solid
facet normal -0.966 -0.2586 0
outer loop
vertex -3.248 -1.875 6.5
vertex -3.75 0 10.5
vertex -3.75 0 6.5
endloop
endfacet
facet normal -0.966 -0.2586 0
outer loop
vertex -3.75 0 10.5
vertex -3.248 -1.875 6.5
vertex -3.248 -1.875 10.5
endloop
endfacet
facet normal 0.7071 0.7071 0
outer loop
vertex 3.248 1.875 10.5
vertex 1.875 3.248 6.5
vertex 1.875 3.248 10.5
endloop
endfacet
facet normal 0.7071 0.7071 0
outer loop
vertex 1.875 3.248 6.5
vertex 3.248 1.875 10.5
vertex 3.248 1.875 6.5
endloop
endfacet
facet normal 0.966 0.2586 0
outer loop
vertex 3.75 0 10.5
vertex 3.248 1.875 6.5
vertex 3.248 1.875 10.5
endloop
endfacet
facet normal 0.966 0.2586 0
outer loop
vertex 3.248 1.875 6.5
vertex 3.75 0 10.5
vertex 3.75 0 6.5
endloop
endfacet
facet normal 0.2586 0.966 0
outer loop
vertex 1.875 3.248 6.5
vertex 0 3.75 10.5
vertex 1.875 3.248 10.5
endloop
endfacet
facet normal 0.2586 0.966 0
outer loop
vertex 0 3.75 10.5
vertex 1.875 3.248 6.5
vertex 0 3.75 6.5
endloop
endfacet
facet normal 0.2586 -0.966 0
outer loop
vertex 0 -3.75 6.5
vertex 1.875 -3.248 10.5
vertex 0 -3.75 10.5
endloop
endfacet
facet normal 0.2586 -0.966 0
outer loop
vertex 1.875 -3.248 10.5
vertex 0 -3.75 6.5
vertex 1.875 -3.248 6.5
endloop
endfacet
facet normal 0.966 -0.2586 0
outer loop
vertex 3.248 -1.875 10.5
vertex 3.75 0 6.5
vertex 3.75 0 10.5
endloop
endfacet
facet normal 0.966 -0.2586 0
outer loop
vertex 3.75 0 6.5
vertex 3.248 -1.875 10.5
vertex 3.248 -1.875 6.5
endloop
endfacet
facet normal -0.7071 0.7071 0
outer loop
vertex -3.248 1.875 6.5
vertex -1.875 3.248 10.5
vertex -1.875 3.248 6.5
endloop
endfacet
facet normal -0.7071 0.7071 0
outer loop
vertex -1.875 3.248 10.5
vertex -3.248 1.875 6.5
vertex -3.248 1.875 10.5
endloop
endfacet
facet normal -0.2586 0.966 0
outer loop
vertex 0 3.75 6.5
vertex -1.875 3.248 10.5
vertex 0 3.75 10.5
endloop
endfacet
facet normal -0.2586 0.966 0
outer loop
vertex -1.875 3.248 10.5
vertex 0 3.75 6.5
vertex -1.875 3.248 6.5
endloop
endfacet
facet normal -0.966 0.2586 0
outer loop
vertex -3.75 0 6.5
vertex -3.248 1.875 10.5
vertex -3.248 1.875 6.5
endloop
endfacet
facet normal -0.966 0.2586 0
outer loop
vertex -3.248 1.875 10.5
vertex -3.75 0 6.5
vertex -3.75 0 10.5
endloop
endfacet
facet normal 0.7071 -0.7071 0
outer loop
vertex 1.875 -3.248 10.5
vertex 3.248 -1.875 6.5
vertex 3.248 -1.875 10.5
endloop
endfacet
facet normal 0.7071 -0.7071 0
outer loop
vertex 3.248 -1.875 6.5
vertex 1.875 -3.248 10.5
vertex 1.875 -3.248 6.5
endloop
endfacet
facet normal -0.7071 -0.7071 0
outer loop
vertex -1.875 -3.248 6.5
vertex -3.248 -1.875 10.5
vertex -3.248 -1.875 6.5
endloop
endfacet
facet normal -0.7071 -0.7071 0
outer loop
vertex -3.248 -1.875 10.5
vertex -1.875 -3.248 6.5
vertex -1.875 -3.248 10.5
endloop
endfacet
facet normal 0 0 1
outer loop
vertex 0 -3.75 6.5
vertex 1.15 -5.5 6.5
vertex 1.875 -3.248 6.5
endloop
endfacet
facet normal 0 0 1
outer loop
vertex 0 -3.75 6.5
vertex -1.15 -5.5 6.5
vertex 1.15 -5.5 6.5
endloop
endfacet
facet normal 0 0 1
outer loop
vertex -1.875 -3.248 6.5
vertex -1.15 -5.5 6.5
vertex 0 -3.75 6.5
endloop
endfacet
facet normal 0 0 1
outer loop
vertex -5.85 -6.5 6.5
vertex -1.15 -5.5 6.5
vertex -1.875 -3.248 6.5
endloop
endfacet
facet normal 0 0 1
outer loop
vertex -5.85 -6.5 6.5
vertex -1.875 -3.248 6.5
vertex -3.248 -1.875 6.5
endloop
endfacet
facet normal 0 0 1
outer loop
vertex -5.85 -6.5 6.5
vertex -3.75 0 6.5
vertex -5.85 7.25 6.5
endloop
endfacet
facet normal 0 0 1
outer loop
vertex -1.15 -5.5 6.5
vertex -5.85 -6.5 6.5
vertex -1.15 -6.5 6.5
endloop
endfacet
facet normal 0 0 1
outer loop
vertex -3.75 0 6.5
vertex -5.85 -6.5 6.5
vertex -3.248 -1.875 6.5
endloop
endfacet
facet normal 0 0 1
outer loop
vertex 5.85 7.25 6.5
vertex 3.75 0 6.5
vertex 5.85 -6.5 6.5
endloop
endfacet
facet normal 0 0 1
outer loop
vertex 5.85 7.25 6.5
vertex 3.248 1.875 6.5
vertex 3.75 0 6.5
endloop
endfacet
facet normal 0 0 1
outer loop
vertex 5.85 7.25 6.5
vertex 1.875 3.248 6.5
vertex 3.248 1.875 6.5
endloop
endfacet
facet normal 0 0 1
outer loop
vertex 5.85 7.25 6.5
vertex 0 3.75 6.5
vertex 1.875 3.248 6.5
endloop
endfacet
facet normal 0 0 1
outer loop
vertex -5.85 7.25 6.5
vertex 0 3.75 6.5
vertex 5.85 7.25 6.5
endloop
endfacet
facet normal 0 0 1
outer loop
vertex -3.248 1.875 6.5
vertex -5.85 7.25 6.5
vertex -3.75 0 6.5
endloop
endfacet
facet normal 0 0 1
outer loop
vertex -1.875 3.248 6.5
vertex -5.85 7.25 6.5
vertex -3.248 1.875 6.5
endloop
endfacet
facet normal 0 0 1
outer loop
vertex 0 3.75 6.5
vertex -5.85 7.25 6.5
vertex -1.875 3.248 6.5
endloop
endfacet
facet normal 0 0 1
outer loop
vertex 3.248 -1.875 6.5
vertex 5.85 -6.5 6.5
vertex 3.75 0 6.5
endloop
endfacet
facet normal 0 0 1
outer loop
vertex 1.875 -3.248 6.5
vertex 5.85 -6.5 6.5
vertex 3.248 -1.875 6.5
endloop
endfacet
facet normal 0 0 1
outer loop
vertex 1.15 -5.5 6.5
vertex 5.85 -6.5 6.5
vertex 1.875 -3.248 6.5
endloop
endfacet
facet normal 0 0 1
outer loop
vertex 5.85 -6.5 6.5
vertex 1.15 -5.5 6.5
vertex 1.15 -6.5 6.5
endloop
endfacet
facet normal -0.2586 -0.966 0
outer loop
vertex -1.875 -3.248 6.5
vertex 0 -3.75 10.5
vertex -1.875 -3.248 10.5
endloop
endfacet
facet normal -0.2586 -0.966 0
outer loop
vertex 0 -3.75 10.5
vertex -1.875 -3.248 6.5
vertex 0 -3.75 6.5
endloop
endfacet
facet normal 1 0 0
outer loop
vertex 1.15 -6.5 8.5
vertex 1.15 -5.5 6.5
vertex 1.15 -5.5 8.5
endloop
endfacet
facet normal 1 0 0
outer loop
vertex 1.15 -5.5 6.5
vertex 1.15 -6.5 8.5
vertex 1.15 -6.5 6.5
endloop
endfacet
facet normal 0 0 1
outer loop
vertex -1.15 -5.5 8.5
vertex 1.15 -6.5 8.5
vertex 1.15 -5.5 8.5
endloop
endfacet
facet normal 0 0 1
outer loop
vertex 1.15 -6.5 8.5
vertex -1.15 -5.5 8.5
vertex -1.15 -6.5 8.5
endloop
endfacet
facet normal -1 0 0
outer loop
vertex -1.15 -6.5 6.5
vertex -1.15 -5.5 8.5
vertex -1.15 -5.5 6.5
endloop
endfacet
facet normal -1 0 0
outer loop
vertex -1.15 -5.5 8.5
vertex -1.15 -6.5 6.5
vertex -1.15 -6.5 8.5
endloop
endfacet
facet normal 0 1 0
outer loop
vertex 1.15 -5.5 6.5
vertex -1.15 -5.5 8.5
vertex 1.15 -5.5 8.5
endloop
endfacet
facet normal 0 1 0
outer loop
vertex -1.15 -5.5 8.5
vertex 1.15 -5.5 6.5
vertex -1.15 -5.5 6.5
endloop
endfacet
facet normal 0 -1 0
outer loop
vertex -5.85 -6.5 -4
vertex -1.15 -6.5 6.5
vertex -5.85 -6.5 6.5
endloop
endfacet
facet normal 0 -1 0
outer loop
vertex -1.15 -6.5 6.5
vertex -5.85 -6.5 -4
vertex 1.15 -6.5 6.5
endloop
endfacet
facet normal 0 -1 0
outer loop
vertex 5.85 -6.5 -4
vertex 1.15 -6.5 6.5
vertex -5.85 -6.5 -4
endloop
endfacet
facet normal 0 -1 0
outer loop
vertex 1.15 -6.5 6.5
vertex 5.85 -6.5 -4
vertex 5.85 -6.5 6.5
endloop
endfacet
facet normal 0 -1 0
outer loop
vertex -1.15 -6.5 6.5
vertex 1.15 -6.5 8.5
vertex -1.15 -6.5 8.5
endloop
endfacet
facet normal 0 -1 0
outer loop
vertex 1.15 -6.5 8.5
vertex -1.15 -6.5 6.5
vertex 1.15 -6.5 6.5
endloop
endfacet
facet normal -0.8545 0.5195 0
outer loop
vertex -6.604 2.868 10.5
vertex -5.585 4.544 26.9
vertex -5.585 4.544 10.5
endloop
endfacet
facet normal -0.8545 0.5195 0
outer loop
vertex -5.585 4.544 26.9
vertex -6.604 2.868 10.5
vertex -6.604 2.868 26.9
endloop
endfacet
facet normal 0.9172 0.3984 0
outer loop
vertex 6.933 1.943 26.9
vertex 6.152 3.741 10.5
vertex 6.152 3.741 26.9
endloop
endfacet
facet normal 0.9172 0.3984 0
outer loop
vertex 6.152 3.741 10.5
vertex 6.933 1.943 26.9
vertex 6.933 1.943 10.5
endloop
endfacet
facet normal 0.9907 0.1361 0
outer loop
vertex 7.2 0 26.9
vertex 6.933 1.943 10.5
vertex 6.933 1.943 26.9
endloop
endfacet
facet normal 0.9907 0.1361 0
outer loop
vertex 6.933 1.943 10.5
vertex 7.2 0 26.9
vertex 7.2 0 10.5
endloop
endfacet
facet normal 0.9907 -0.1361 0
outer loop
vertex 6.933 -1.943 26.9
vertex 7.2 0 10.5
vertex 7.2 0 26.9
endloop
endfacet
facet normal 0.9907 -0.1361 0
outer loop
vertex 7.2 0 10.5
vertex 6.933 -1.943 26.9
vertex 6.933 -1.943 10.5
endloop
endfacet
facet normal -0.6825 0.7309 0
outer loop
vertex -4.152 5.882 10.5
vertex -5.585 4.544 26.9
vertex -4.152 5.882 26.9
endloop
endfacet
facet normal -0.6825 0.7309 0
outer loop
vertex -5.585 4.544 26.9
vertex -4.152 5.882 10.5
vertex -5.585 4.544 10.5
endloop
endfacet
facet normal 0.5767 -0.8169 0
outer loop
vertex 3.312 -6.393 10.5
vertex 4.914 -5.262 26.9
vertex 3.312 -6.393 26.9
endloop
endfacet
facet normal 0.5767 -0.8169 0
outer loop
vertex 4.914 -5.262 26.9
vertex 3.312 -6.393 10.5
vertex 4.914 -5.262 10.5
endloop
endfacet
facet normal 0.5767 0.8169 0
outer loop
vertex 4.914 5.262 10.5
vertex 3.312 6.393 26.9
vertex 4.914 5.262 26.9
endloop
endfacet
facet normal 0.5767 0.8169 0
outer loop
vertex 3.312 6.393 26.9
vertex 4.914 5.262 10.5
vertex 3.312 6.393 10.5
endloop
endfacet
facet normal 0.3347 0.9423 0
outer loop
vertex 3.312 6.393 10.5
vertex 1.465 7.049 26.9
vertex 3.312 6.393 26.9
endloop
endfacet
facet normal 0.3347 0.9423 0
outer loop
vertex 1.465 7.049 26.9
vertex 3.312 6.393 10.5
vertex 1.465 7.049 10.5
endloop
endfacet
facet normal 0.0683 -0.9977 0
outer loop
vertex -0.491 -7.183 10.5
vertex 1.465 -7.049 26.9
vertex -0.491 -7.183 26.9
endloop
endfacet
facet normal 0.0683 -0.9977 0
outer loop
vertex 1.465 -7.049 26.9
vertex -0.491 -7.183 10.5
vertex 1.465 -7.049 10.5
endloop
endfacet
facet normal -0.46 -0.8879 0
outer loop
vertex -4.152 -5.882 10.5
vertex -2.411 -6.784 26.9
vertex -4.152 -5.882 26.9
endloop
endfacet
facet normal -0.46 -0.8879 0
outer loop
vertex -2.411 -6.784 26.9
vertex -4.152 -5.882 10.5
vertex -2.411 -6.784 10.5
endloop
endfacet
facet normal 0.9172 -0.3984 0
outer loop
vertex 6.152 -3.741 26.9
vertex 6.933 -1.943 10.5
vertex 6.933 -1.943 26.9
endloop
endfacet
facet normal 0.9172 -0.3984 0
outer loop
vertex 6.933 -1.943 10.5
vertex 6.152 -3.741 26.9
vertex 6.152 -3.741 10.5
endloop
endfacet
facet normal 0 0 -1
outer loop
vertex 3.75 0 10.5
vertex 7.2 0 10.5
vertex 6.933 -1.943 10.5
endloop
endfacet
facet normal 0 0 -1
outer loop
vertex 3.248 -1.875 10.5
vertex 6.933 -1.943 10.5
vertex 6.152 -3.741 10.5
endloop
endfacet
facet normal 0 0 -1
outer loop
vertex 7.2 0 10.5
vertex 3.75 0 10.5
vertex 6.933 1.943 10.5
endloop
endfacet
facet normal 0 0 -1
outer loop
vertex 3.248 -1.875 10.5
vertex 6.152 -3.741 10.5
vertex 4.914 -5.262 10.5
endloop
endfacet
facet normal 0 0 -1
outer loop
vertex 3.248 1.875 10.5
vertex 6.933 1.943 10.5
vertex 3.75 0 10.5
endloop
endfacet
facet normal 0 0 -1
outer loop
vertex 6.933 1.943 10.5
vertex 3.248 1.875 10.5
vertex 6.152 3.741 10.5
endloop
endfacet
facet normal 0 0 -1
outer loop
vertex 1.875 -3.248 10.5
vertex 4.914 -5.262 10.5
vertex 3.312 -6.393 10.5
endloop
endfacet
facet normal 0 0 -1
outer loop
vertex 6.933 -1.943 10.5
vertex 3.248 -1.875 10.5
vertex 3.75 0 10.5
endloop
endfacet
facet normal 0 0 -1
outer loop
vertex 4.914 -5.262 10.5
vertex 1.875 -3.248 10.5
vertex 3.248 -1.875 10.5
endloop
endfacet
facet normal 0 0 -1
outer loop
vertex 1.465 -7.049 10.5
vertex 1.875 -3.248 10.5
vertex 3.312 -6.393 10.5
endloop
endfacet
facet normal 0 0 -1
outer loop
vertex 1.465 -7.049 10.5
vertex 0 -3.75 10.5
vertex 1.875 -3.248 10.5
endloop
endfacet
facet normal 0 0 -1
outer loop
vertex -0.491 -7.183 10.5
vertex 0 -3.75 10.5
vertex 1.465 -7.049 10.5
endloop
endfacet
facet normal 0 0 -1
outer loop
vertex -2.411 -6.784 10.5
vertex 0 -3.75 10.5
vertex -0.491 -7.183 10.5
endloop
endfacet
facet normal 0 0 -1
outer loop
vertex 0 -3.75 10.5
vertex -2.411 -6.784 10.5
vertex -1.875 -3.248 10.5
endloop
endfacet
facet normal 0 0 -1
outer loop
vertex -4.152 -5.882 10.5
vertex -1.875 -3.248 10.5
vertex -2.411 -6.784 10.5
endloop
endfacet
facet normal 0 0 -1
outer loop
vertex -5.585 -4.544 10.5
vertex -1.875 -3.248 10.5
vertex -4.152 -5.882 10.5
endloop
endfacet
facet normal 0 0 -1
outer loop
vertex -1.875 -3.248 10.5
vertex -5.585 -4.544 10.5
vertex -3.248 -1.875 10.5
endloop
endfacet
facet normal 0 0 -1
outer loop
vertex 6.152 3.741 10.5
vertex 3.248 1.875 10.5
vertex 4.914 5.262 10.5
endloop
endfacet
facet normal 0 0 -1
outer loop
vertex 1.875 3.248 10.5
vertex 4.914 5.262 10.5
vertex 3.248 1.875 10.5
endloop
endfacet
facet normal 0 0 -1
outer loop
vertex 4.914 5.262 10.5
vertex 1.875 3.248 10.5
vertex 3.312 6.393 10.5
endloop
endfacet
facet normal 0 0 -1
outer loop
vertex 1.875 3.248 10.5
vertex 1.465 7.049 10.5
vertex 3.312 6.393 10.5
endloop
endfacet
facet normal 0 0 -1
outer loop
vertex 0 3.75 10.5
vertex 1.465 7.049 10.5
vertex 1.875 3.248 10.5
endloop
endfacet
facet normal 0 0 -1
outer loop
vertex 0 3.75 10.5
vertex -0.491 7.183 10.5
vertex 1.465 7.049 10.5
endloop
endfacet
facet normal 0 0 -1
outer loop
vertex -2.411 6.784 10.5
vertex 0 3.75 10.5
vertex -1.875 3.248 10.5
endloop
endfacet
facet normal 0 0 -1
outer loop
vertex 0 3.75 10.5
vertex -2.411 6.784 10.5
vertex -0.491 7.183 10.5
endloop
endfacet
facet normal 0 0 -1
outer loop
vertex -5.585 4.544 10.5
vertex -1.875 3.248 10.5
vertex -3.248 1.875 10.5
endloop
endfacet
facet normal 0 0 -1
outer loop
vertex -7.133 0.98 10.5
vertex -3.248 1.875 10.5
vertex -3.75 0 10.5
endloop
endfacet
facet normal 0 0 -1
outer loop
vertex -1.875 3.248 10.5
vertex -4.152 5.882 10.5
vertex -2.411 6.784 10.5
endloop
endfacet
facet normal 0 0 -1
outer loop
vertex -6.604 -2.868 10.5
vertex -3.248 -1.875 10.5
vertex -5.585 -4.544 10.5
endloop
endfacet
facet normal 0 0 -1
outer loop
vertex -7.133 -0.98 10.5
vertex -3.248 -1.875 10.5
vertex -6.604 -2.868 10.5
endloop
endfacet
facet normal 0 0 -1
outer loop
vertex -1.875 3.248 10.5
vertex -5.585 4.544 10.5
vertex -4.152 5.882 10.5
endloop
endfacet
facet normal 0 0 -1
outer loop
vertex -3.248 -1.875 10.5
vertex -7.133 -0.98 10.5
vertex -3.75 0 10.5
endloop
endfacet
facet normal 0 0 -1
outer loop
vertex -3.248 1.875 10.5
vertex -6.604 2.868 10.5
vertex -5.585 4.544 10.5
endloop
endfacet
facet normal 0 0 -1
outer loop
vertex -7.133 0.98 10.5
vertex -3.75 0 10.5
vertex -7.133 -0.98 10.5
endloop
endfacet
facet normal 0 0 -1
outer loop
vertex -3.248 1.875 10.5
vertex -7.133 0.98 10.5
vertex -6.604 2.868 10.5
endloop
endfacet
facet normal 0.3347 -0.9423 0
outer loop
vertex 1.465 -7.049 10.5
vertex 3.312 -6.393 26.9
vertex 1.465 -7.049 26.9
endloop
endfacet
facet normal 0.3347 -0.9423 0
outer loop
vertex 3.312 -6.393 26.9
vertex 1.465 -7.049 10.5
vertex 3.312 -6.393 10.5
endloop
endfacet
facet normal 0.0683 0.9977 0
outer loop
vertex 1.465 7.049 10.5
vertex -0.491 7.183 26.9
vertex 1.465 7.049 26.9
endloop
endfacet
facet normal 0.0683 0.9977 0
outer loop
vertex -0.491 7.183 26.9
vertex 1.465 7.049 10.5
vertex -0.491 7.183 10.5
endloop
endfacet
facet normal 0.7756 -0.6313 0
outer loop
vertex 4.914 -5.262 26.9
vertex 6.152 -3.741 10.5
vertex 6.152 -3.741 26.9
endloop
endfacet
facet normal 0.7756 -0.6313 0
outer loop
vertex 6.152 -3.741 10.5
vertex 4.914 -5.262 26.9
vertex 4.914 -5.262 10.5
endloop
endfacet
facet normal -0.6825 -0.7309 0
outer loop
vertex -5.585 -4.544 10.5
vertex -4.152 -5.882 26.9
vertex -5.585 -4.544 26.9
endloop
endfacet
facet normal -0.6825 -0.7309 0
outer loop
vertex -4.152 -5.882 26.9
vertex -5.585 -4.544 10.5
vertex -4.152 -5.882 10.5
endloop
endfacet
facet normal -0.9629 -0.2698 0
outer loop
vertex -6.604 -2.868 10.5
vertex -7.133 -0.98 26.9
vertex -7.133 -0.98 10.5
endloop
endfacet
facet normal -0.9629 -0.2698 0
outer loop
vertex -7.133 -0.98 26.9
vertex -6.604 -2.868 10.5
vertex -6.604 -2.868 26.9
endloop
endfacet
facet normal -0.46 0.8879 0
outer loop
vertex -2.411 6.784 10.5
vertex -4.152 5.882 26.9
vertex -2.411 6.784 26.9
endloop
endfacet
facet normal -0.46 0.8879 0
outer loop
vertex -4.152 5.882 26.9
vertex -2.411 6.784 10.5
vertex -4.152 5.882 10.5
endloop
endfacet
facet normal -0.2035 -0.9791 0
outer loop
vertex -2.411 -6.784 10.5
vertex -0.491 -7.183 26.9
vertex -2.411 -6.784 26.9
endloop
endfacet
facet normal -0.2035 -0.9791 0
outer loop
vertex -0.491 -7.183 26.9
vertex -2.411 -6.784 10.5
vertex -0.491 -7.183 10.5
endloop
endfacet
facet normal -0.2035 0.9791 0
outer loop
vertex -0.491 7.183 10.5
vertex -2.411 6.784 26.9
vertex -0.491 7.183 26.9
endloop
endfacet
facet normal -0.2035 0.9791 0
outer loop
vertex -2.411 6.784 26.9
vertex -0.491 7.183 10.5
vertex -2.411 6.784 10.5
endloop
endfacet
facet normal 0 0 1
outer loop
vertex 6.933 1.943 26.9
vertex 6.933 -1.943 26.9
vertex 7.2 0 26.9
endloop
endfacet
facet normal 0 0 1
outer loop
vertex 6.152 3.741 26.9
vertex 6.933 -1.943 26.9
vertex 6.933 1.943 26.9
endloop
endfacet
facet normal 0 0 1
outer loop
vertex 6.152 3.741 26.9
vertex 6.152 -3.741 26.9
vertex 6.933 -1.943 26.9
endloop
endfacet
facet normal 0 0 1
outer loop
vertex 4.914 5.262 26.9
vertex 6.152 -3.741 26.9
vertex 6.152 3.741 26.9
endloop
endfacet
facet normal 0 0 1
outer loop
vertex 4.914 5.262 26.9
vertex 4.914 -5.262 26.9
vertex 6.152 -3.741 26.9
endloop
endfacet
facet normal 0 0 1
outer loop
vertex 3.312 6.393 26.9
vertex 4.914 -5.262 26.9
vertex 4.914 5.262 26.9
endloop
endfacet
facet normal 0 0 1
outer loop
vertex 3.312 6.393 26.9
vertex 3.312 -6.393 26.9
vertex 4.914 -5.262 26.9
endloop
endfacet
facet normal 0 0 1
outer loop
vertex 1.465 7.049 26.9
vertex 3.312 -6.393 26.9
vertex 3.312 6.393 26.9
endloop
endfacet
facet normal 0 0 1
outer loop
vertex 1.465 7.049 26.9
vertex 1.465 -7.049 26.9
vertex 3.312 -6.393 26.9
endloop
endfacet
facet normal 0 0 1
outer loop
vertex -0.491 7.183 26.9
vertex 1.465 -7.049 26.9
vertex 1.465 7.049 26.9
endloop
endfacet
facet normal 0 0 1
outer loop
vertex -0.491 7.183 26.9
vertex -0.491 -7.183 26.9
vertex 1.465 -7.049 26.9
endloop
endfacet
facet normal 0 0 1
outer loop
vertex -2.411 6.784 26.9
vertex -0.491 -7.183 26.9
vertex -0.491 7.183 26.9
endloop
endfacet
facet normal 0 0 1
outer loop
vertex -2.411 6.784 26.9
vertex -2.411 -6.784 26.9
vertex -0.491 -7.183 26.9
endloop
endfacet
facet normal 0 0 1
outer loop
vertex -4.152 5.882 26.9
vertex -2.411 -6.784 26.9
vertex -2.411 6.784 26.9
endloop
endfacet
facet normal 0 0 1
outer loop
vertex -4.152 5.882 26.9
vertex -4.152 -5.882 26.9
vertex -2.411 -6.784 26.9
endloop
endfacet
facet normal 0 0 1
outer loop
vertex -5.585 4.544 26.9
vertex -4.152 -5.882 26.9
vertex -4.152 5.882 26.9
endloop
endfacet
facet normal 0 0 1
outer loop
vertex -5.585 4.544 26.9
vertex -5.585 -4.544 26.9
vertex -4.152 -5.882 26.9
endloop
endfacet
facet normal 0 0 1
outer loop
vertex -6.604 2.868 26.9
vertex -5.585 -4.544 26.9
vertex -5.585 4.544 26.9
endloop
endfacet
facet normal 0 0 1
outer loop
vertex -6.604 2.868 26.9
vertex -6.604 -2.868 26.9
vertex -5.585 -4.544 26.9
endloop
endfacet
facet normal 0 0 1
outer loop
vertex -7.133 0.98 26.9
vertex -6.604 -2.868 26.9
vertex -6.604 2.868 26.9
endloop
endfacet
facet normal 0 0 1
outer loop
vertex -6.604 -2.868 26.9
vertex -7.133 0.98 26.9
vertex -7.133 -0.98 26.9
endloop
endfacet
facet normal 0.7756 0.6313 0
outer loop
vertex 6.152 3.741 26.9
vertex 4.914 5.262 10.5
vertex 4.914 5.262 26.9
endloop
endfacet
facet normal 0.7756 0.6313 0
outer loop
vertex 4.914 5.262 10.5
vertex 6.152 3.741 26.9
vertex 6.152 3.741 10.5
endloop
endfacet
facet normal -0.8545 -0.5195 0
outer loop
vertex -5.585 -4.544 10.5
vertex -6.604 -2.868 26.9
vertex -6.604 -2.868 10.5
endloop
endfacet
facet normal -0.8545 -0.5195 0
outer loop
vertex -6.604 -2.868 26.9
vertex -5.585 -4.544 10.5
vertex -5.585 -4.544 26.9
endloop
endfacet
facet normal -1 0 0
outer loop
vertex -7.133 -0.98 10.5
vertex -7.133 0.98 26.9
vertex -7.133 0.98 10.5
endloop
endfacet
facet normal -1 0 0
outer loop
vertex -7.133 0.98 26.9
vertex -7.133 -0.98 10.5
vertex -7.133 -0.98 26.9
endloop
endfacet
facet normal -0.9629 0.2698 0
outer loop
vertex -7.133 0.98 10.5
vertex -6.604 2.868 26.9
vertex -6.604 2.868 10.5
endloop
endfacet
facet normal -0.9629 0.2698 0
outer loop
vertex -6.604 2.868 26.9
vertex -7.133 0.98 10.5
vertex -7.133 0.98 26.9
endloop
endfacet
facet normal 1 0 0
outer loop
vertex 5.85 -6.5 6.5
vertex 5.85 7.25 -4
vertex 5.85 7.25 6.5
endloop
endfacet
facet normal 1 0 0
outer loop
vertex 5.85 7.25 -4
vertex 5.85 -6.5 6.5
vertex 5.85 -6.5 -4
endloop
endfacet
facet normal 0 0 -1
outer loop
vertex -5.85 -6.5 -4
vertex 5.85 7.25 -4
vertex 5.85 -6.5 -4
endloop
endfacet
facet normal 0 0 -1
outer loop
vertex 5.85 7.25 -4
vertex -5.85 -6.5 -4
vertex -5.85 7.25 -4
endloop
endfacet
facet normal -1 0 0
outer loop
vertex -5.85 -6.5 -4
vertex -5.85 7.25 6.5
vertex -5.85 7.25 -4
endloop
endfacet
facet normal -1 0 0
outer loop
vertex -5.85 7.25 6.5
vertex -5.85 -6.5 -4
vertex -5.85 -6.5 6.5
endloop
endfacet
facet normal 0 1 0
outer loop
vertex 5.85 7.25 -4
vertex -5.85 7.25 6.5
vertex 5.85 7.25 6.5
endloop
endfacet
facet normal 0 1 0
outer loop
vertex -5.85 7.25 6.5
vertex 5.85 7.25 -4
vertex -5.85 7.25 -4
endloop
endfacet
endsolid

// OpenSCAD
// file: flat-ui-colors.scad
flatui = [
    "#1abc9c",
    "#2ecc71",
    "#3498db",
    "#9b59b6",
    "#34495e",
    "#f1c40f",
    "#e67e22",
    "#e74c3c",
    "#ecf0f1",
    "#95a5a6",
];
// main file
include <./flat-ui-colors.scad>;

encoderCutoutD = 7.5;
encoderCutoutH = 20;

encoderKnobD = 14.4;
encoderKnobH = 16.4;

encoderBaseX = 11.7;
encoderBaseY = 13.75;
encoderBaseH = 6.5;

encoderPinsH = 4;

module encoderKnob() {
    translate([0, 0, encoderBaseH + 4])
    color("#ef5777") cylinder(h=encoderKnobH, d=encoderKnobD);
}

module encoderPanel(cutout = false, thickness = encoderCutoutH) {
    translate([0, 0, encoderBaseH])
    color("#0be881") cylinder(h=encoderCutoutH, d=encoderCutoutD);
    
    if (cutout == false) {
        translate([0, -6, encoderBaseH + 1])
        color("#ffc048") cube([2.3, 1, 2], center=true);
        
    } else {
        translate([0, -6, encoderBaseH + (thickness / 2)])
        color("#ffc048") cube([2.3, 1, thickness], center=true);
    }
}

module encoderBase() {
    translate([-(encoderBaseX / 2), -6.5, 0])
    color("#575fcf") cube([encoderBaseX, encoderBaseY, encoderBaseH]);
}

module encoderPins() {
    translate([-(encoderBaseX / 2), -6.5, -encoderPinsH])
    color("#4bcffa") cube([encoderBaseX, encoderBaseY, encoderPinsH]);
}

module rotaryEncoder(cutout=false, thickness = 3) {
    encoderPanel(cutout, thickness);
    encoderBase();
    
    if (cutout == false) {
        encoderKnob();
        
        encoderPins();
    }
}

rotaryEncoder();

/*rotaryEncoder();

translate([20, 0, 0])
rotaryEncoder(true);*/
